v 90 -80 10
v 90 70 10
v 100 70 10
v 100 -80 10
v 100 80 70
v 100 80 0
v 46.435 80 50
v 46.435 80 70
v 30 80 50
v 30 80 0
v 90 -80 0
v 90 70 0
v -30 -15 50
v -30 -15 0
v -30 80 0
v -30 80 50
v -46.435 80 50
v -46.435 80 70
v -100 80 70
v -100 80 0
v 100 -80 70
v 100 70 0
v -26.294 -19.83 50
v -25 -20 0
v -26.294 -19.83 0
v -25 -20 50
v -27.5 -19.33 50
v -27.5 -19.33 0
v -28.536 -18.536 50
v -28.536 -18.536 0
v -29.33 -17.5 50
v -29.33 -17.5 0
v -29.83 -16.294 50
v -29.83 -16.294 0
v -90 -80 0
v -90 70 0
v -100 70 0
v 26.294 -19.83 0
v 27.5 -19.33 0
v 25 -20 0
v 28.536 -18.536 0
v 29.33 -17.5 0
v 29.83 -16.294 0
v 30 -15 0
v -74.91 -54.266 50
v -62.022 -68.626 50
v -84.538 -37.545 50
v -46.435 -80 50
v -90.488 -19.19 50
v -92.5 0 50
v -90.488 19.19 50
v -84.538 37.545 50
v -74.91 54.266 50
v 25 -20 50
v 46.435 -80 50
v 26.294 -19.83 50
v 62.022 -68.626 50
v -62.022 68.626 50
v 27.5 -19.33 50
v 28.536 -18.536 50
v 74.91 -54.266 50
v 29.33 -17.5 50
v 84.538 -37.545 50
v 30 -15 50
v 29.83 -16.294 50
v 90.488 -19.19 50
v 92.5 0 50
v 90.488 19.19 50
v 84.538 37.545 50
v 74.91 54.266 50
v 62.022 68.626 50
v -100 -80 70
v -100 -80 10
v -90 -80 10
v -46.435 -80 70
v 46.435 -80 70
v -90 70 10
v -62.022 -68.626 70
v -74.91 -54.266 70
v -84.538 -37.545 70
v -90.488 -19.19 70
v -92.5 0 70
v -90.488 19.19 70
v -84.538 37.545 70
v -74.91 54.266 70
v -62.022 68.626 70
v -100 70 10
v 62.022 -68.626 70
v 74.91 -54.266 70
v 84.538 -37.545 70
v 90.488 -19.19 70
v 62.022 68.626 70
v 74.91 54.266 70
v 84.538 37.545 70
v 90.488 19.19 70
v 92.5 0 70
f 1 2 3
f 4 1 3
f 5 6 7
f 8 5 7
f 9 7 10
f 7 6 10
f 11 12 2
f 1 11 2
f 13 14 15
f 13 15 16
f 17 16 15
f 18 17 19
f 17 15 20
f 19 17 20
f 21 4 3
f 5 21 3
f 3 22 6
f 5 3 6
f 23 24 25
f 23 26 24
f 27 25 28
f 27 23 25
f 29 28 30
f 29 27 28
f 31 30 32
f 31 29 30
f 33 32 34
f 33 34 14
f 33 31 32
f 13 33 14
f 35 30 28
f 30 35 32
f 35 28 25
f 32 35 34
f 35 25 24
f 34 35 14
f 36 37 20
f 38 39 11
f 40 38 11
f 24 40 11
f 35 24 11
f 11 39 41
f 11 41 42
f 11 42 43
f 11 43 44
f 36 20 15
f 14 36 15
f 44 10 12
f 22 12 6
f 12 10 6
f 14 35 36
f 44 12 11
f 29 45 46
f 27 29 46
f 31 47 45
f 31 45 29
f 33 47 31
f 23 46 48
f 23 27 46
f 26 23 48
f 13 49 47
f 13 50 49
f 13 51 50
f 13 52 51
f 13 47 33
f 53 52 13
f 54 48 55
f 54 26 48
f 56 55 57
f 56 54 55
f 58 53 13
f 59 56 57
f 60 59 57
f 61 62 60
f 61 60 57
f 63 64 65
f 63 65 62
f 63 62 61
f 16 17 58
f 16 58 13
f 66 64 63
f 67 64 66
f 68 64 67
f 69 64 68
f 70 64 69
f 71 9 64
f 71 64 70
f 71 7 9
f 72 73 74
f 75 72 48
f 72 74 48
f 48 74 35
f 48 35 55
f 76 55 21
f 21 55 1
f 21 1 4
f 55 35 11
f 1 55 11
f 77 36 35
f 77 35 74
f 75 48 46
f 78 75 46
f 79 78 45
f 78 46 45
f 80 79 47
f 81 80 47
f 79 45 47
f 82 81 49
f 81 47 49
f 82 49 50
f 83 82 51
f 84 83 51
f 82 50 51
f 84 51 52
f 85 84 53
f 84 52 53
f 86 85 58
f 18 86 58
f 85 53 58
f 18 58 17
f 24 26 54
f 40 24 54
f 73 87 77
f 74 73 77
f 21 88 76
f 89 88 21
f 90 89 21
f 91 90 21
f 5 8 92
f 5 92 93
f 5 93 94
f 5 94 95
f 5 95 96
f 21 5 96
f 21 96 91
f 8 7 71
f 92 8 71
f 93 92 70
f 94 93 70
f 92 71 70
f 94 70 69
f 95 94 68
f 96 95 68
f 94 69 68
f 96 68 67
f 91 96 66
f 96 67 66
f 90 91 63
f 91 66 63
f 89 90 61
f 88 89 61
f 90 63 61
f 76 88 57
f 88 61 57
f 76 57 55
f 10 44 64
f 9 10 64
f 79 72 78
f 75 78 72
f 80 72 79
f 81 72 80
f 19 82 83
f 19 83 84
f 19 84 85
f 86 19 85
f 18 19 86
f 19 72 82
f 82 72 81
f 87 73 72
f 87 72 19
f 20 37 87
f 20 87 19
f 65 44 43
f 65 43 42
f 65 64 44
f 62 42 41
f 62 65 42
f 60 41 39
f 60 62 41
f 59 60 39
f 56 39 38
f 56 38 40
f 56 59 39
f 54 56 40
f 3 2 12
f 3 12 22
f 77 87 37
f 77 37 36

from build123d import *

# Parameters (mm, degrees)
F0_W          = 200
F0_H          = 160
F1_DEPTH      = 50
F3_DEPTH      = 20
F5_W          = 60
F5_H          = 120
F6_DEPTH      = 90
F6_DEPTH_BACK = 20
F9_W          = 10
F9_H          = 10
F10_DEPTH     = 150
F11_R         = 5


with BuildPart() as f1:
    # F0 (on Top) → F1 (new body)
    with BuildSketch(Plane.XY):
        Rectangle(F0_W, F0_H)
    extrude(amount=F1_DEPTH)

    # F2 (on face) → F3 (join)
    with BuildSketch(Plane.XY.offset(50)):
        with BuildLine():
            ThreePointArc((46.4354390525, 80), (80.1608636192, 46.1571873474), (92.5, 0))
            ThreePointArc((92.5, 0), (80.1608636192, -46.1571873474), (46.4354390525, -80))
            Line((46.4354390525, -80), (100, -80))
            Line((100, -80), (100, 80))
            Line((100, 80), (46.4354390525, 80))
        make_face()
        with BuildLine():
            ThreePointArc((-46.4354390525, -80), (-92.5, 0), (-46.4354390525, 80))
            Line((-46.4354390525, 80), (-100, 80))
            Line((-100, 80), (-100, -80))
            Line((-100, -80), (-46.4354390525, -80))
        make_face()
    extrude(amount=F3_DEPTH)

    # F5 (on Front) → F6 (cut, two sides)
    with BuildSketch(Plane.XZ) as f6_sk:
        Rectangle(F5_W, F5_H)
    extrude(amount=-F6_DEPTH, mode=Mode.SUBTRACT)
    extrude(f6_sk.sketch, amount=F6_DEPTH_BACK, mode=Mode.SUBTRACT)

    # F9 (on face) → F10 (cut)
    with BuildSketch(Plane.XZ.offset(80)):
        with Locations((95, 5)):
            Rectangle(F9_W, F9_H)
        with Locations((-95, 5)):
            Rectangle(F9_W, F9_H)
    extrude(amount=-F10_DEPTH, mode=Mode.SUBTRACT)

    # F11
    f11_edges = [f1.edges().sort_by_distance(p)[0] for p in [
        (-30, -20, 25),
        (30, -20, 25),
    ]]
    fillet(f11_edges, radius=F11_R)


solid = f1.part
